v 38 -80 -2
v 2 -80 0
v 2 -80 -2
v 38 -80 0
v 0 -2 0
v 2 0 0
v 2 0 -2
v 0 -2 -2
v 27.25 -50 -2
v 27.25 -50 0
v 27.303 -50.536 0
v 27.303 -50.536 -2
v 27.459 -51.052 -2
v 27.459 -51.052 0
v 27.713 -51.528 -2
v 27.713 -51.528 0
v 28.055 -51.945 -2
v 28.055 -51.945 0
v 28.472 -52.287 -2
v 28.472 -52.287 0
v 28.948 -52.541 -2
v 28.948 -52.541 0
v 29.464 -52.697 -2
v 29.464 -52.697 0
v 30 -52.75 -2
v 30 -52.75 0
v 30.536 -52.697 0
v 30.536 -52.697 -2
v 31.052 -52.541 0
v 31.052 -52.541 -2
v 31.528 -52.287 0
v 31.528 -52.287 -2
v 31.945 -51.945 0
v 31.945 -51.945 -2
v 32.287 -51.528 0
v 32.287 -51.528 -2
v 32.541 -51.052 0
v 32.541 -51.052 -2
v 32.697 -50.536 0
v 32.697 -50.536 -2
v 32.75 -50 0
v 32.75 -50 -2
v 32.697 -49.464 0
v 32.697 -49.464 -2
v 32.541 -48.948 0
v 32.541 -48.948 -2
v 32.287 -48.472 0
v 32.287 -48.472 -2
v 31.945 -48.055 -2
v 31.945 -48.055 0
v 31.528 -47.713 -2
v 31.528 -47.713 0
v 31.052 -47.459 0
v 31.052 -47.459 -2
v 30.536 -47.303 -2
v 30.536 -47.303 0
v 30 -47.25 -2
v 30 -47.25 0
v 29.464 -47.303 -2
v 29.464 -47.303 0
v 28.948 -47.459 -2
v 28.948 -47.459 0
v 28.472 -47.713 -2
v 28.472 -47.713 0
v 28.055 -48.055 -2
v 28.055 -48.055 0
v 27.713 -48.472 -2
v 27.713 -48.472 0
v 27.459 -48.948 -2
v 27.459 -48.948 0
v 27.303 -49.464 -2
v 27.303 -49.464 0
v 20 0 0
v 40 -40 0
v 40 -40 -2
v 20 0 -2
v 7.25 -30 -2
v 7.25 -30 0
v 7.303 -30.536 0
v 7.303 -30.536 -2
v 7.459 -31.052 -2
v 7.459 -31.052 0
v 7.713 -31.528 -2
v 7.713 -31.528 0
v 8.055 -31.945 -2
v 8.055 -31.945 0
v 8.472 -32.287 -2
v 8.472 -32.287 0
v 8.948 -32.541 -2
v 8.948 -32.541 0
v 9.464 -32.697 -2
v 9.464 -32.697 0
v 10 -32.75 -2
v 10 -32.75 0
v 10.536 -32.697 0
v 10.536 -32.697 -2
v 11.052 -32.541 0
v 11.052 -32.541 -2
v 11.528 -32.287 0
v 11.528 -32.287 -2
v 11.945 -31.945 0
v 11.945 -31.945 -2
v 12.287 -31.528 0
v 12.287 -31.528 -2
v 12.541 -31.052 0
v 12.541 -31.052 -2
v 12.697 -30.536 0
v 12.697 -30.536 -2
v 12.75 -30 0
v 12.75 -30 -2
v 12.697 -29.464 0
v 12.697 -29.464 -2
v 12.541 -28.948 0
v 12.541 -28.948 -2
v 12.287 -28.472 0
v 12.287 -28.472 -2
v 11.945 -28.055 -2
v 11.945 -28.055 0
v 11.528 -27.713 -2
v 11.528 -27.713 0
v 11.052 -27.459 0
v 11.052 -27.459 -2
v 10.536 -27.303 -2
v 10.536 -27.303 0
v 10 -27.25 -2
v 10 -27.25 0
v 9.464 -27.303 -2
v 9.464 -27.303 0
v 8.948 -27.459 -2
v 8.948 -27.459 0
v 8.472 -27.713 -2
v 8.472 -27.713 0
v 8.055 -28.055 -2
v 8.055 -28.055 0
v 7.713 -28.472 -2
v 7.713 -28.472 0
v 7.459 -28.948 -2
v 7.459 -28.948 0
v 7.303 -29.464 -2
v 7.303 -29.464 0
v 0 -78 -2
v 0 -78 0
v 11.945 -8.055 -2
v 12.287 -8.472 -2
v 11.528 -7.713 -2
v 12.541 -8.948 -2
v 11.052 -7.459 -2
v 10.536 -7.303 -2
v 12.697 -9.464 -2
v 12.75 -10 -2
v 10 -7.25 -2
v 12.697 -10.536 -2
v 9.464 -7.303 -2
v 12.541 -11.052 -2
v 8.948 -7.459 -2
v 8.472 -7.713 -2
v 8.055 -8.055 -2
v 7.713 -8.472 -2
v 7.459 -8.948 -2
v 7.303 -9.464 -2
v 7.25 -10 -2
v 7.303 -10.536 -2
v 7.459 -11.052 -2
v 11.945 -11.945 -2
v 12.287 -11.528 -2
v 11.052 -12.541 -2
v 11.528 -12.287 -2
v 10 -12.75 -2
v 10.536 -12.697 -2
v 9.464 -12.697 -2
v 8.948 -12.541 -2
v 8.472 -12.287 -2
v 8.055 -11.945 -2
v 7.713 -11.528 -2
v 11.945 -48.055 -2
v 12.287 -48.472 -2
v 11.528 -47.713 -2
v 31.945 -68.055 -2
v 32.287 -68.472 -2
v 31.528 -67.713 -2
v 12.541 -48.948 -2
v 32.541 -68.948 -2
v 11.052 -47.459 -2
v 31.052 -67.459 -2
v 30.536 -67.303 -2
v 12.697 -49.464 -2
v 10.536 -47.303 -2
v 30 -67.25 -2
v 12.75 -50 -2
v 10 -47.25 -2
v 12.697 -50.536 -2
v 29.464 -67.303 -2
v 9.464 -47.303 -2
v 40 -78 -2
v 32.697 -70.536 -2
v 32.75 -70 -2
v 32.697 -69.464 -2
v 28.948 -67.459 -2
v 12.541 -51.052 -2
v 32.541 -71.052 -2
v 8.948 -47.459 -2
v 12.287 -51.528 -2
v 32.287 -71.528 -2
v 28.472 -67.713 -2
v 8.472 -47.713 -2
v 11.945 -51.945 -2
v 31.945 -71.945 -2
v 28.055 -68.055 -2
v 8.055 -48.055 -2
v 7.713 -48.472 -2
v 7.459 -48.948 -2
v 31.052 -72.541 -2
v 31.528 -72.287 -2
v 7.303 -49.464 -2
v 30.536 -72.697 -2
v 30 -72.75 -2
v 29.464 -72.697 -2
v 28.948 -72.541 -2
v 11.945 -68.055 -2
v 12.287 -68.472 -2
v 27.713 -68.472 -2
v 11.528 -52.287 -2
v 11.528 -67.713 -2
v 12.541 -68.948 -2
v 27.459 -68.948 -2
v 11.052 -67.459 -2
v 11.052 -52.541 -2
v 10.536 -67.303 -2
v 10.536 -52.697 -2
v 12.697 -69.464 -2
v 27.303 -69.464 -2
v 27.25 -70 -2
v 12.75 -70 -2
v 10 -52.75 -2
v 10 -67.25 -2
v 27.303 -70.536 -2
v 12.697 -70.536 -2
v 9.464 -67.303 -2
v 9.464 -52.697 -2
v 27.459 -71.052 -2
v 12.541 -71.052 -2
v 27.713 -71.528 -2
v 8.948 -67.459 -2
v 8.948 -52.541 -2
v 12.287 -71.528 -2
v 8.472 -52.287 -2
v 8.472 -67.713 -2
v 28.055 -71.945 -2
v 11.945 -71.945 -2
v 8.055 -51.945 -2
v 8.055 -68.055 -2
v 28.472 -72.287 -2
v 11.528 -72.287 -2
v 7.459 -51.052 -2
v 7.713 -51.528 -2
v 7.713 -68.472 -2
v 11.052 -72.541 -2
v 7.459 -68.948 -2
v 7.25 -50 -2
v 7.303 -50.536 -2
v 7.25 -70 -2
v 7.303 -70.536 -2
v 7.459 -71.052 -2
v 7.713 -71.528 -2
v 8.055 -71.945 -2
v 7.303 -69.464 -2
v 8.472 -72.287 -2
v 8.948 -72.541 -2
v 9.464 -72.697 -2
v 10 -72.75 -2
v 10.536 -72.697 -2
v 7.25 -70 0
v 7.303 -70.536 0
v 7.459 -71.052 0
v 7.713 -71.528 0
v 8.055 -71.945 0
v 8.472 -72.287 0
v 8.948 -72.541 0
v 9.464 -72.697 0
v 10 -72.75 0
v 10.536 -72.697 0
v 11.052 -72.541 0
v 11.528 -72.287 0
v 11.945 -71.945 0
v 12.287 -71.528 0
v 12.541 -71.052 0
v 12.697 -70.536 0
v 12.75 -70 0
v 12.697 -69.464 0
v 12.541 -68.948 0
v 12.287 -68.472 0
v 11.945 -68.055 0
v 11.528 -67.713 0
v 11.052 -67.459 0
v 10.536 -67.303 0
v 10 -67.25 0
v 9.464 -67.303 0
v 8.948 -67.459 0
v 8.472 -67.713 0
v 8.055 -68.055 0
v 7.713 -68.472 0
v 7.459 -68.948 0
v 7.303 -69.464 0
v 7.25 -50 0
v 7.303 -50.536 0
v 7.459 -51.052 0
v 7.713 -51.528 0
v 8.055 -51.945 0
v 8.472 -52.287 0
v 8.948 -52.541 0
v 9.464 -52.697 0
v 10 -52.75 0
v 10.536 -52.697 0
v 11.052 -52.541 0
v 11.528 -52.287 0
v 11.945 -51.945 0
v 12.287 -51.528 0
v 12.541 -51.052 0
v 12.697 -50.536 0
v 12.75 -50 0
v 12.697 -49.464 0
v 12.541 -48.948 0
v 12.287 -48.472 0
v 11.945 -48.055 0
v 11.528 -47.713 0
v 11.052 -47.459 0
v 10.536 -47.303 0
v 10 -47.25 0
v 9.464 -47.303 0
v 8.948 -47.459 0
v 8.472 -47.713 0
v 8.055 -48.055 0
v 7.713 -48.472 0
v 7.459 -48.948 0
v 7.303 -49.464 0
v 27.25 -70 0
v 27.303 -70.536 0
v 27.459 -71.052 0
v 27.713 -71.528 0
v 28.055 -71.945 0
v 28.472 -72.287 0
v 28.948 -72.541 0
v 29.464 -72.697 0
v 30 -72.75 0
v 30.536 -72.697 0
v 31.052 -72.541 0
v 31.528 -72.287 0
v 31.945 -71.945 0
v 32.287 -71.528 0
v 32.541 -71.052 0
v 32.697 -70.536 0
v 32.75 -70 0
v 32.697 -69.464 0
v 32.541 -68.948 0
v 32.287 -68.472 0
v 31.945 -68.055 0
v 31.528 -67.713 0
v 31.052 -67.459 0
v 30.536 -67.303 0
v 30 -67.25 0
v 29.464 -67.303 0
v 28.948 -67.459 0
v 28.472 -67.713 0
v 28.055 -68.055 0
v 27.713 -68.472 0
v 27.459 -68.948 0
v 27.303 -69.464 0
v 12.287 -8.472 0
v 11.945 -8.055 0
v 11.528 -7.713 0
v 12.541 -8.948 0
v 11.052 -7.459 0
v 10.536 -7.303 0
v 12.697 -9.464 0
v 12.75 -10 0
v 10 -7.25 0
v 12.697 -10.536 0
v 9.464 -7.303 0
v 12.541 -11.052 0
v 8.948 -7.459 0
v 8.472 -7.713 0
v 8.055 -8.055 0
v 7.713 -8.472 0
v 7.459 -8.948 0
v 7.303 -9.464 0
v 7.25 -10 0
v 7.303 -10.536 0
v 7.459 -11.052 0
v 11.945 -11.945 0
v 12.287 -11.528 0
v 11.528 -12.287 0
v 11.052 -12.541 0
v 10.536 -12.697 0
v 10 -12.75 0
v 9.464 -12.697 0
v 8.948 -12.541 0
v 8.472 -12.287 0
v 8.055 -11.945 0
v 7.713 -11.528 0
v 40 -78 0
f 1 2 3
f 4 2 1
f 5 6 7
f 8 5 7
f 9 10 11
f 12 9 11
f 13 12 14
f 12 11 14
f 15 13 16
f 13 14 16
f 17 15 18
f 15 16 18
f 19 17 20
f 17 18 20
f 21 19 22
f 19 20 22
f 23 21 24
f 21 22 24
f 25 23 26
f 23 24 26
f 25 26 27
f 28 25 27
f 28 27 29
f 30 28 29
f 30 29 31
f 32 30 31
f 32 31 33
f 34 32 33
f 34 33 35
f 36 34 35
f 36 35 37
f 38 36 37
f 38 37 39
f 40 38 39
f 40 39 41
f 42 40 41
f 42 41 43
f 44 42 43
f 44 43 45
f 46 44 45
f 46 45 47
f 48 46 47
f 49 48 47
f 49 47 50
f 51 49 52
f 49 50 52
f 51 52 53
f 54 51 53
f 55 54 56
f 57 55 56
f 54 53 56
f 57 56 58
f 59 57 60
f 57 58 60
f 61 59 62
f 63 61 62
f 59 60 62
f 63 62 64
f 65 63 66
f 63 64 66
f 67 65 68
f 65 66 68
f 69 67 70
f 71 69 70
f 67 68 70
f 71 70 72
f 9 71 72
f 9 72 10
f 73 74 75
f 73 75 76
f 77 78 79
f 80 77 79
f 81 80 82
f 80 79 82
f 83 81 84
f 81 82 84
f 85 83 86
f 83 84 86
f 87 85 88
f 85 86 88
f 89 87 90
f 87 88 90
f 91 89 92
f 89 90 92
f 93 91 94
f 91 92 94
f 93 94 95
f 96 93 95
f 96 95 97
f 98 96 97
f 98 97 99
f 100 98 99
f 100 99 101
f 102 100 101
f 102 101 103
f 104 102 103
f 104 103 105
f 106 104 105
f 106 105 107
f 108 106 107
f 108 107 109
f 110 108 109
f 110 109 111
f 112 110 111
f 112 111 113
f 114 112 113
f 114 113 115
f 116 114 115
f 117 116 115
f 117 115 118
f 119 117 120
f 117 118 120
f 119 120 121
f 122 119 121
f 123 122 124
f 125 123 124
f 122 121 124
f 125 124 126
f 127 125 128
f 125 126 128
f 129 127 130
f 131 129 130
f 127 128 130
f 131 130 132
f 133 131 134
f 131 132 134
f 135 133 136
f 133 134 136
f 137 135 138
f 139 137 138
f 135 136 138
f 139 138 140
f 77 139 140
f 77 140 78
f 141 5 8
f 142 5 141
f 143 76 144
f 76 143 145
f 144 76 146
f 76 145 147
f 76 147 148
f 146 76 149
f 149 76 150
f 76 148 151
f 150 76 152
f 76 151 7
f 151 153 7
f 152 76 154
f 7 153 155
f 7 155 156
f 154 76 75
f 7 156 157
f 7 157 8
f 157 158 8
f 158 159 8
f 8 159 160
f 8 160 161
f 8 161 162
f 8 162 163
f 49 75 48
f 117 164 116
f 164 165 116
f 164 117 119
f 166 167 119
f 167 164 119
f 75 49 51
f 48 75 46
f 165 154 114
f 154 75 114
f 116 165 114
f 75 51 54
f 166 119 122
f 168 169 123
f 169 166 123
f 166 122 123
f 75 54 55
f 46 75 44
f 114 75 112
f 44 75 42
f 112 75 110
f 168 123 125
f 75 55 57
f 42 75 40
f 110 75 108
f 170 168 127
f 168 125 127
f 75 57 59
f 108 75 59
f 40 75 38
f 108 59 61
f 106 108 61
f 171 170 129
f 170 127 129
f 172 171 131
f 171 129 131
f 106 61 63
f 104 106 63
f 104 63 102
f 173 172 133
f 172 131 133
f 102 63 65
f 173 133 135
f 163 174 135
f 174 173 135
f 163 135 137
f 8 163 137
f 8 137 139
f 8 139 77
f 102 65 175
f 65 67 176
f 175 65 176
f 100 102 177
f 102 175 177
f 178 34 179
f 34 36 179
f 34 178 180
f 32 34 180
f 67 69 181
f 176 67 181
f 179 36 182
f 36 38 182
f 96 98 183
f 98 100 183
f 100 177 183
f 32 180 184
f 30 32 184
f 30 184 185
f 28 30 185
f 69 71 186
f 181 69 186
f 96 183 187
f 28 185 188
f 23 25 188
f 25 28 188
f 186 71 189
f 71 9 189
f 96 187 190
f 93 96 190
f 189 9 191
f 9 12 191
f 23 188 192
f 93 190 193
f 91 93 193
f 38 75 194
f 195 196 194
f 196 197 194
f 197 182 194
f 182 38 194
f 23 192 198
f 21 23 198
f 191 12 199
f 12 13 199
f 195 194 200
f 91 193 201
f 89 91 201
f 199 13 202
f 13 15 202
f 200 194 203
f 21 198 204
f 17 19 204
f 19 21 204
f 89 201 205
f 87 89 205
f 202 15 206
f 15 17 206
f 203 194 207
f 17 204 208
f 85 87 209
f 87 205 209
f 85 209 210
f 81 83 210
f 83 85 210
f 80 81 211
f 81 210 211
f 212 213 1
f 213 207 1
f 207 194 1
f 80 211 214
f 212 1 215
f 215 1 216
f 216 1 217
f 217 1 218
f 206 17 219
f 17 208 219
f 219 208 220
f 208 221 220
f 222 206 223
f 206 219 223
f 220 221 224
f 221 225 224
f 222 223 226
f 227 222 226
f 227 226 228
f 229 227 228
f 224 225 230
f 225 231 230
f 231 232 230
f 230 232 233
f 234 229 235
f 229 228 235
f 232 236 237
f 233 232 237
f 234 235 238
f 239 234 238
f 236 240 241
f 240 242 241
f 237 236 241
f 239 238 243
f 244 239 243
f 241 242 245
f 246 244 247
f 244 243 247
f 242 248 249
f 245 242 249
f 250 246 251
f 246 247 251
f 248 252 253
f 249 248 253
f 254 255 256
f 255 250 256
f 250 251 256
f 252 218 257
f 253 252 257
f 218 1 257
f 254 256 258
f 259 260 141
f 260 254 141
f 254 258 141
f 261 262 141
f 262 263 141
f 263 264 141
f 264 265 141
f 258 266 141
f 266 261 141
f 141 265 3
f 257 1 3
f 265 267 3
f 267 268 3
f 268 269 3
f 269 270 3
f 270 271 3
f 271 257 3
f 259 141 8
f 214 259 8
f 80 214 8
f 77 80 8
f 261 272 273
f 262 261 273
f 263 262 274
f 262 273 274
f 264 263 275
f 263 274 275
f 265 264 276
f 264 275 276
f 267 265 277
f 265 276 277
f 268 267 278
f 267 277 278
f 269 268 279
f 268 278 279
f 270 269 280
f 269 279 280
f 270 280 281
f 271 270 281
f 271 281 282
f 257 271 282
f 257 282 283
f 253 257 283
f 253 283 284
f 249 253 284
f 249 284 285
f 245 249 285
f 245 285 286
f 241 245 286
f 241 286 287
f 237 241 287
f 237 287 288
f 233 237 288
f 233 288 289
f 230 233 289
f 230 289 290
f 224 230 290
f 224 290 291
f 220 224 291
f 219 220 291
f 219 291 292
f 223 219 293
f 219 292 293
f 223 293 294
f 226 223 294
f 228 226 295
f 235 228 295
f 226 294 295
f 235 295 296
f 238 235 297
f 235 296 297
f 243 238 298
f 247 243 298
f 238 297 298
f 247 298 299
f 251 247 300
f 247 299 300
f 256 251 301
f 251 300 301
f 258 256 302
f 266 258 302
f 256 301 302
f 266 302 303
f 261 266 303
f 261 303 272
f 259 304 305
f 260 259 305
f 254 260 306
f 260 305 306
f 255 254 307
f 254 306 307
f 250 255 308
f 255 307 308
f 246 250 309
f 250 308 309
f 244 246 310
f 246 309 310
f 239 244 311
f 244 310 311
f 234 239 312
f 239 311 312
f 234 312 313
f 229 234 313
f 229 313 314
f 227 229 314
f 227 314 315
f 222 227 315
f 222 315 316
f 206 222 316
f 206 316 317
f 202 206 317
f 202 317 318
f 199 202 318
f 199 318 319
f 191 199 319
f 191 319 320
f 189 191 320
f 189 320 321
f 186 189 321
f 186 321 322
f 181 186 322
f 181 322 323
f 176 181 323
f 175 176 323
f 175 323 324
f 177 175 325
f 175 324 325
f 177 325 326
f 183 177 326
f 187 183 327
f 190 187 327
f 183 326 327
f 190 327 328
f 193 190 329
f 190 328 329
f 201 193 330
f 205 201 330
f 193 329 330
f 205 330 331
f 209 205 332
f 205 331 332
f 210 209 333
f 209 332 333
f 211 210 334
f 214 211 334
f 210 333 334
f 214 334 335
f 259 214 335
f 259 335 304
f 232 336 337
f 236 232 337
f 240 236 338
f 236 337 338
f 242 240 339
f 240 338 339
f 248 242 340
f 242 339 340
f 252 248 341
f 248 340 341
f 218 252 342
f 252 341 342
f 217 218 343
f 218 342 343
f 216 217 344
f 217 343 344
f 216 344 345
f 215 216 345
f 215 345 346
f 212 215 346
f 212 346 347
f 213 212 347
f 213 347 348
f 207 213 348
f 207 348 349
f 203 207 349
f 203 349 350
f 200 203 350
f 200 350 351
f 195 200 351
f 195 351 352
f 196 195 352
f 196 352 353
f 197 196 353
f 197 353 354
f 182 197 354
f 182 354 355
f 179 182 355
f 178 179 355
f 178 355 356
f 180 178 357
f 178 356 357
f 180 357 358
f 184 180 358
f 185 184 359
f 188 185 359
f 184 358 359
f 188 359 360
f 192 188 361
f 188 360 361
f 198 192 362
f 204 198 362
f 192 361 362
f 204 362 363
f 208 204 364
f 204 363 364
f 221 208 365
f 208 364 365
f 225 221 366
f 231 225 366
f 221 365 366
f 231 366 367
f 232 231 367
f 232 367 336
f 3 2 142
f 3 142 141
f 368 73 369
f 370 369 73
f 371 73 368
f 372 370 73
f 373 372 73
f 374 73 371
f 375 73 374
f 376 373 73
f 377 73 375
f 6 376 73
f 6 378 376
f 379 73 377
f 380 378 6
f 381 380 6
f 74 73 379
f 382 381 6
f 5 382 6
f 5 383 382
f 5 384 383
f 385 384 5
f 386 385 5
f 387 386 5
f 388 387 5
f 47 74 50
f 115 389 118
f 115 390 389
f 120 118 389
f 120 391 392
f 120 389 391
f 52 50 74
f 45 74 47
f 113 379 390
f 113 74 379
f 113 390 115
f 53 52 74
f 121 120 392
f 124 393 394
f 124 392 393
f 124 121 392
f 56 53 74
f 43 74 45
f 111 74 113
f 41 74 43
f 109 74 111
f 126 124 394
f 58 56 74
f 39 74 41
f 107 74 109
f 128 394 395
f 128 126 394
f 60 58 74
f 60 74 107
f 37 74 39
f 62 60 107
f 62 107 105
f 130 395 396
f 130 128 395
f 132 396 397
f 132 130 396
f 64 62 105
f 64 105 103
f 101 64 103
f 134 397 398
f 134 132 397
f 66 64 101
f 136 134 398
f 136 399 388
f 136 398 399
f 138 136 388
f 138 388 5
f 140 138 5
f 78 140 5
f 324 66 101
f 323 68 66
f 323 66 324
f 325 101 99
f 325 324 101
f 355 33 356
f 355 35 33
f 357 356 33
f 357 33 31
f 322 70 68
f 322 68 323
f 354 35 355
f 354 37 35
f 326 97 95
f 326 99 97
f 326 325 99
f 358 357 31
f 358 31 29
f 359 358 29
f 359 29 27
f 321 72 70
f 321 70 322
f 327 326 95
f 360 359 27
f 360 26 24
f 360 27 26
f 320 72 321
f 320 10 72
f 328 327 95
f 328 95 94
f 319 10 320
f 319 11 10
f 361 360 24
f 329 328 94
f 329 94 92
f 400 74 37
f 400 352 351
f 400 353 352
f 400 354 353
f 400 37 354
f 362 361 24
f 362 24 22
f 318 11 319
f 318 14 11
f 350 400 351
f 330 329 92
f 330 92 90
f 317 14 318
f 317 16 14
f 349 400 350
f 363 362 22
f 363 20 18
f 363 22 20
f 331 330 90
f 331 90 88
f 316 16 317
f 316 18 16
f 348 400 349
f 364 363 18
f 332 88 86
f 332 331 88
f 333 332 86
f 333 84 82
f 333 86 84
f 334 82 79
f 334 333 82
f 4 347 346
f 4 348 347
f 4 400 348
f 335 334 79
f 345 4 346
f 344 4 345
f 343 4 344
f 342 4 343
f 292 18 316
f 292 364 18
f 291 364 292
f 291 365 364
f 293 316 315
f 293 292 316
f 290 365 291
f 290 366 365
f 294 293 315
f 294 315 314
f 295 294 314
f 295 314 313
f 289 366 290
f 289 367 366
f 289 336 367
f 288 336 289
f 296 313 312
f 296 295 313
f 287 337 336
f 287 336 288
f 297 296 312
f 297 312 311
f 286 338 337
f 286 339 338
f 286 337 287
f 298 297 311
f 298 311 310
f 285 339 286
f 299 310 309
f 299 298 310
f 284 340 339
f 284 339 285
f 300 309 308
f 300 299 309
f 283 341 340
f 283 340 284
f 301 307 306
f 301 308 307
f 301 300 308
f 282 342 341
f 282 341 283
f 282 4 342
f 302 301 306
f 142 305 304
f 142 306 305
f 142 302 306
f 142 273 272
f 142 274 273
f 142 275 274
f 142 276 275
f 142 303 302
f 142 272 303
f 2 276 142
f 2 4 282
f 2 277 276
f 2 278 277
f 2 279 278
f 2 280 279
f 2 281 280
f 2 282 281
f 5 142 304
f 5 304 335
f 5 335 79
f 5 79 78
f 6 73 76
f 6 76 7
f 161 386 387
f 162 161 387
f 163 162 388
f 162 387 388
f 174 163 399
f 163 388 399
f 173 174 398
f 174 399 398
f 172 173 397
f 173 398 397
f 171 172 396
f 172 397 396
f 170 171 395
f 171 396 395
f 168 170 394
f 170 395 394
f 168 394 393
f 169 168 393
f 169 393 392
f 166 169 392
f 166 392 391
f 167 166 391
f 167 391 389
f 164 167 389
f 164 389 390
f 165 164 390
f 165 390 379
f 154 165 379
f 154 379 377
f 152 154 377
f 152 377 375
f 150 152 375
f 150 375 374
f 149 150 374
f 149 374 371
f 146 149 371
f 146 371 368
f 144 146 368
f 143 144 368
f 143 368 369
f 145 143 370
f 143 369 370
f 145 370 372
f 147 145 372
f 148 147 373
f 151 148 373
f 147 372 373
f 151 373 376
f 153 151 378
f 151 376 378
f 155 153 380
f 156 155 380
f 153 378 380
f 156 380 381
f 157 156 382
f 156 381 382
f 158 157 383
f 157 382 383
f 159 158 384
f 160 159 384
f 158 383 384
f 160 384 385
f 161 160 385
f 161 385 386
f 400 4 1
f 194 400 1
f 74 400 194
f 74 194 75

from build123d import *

# Parameters (mm, degrees)
EXTRUDE_1_DEPTH   = 2
HOLE_WIZARD_M51_D = 5.5
CHAMFER_1_SIZE    = 2


with BuildPart() as part:
    # Эскиз1 → Бобышка-Вытянуть1 (new body)
    with BuildSketch(Plane(origin=(0, 0, 0), x_dir=(1, 0, 0), z_dir=(0, 0, -1))):
        Polygon((0, 0), (0, 80), (40, 80), (40, 40), (20, 0), align=None)
    extrude(amount=EXTRUDE_1_DEPTH)

    # Отверстие с зазором M51 (through all)
    with Locations(Plane(origin=(0, 0, -2), x_dir=(1, 0, 0), z_dir=(0, 0, -1))):
        with Locations((10, 70), (10, 50), (10, 30), (10, 10), (30, 70), (30, 50)):
            Hole(HOLE_WIZARD_M51_D / 2)

    # Фаска1
    chamfer_1_edges = [part.edges().sort_by_distance(p)[0] for p in [
        (0, 0, -1),
        (0, -80, -1),
        (40, -80, -1),
    ]]
    chamfer(chamfer_1_edges, length=CHAMFER_1_SIZE)


solid = part.part
